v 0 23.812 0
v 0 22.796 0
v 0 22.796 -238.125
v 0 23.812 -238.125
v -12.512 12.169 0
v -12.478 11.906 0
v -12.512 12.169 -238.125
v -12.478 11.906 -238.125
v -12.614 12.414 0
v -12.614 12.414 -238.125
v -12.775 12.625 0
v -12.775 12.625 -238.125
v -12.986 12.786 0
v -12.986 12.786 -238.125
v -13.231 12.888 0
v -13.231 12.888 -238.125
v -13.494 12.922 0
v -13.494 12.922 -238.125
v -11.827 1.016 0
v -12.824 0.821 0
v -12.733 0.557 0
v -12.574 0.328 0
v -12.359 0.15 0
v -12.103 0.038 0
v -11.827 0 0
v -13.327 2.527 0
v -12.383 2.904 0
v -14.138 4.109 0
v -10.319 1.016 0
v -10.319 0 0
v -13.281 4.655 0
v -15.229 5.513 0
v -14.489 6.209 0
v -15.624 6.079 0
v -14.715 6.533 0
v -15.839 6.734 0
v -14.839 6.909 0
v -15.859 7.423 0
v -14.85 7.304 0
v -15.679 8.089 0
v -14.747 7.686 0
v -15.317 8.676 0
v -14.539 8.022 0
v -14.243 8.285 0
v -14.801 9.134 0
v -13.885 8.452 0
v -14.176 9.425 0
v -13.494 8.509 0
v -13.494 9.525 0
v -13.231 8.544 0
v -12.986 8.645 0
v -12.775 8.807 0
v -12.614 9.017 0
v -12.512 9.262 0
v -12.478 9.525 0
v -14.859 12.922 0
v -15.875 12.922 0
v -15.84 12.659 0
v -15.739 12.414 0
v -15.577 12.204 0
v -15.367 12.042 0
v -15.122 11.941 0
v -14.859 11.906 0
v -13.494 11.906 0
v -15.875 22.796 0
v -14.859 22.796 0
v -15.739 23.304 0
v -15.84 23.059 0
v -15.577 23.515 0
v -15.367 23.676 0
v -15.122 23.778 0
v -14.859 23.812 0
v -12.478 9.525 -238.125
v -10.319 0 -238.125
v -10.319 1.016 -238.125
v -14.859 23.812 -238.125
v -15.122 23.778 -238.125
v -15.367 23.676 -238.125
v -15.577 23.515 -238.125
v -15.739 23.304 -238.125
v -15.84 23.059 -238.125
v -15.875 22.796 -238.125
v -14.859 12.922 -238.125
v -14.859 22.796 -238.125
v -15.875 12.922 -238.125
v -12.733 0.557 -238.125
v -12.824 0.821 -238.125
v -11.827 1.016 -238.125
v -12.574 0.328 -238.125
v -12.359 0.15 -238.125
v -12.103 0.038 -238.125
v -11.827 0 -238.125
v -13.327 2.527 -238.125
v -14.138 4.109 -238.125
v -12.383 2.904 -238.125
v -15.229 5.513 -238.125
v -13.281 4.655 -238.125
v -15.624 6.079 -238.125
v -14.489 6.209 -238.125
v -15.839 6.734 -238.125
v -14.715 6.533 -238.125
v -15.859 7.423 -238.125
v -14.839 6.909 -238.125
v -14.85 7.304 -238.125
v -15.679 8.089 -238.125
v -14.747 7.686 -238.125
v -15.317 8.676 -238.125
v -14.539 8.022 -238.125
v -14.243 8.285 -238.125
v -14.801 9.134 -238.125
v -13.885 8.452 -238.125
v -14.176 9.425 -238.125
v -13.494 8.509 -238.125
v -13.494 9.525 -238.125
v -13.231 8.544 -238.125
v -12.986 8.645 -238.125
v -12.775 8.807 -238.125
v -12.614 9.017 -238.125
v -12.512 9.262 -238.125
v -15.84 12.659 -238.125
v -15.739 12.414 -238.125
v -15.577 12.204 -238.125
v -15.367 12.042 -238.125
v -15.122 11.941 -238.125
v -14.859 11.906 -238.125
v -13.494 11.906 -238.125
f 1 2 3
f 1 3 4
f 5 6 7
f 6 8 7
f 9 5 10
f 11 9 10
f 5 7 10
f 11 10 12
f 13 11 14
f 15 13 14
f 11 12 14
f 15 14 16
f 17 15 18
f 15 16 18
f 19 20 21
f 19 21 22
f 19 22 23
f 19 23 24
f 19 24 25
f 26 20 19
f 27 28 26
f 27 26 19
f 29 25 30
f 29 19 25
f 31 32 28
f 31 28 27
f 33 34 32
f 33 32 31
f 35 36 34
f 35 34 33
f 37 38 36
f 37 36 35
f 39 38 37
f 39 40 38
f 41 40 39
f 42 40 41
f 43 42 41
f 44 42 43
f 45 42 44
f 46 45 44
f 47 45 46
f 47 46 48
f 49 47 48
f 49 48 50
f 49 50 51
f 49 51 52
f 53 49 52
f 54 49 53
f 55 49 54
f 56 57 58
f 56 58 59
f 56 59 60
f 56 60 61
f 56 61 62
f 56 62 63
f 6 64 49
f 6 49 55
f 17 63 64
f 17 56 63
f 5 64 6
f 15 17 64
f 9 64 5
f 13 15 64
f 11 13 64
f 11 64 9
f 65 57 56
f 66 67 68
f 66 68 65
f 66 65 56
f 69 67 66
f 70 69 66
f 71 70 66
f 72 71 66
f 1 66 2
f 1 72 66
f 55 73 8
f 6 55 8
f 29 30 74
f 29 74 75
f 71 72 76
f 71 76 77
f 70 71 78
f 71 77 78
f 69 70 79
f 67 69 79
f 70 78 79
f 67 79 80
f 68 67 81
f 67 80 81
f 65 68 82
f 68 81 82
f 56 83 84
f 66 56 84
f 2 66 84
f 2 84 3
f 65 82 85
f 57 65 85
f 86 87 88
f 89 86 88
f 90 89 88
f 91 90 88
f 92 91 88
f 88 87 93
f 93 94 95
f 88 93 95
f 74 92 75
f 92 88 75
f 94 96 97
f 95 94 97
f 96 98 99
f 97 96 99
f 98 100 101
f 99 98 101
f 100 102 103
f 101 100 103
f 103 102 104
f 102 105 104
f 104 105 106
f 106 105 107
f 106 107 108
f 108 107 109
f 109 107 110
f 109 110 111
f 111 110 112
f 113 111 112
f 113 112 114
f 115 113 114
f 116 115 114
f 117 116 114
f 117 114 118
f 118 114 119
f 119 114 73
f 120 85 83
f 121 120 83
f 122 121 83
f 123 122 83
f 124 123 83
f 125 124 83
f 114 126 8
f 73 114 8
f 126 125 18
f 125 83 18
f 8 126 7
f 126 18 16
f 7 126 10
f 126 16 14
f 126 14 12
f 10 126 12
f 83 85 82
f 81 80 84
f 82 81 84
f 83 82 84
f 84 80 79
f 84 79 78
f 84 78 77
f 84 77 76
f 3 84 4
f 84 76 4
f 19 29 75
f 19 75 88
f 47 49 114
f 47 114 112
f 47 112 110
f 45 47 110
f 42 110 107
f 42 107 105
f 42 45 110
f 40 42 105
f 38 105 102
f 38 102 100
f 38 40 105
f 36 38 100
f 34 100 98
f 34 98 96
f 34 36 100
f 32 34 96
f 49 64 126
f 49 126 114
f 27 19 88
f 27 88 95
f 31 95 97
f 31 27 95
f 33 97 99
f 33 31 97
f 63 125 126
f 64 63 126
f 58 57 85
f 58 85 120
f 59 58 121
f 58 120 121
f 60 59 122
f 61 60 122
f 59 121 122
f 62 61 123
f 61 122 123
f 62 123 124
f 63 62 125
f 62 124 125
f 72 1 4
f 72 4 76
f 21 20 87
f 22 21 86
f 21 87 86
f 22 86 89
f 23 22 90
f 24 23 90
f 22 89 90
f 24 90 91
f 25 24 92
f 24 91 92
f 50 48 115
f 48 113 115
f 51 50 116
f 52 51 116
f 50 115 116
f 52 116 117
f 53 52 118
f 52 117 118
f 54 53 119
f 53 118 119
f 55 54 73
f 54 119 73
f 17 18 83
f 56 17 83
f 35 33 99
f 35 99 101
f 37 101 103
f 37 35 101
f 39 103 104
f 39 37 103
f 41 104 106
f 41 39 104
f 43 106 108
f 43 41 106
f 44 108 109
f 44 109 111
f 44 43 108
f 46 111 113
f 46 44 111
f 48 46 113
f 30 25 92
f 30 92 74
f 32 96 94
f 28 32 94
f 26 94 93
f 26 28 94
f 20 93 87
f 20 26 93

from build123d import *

# Parameters (mm, degrees)
EXTRUDE_THIN1_DEPTH = 238.125
FILLET1_R           = 1.016


with BuildPart() as part:
    # Sketch1 → Extrude-Thin1 (new body)
    with BuildSketch(Plane.XY):
        with BuildLine():
            Line((0, 23.8125), (-15.875, 23.8125))
            Line((-15.875, 23.8125), (-15.875, 11.90625))
            Line((-15.875, 11.90625), (-13.49375, 11.90625))
            Line((-13.49375, 11.90625), (-13.49375, 9.525))
            ThreePointArc((-13.49375, 9.525), (-15.679243133, 8.08925057), (-15.229296459, 5.51334206))
            ThreePointArc((-15.229296459, 5.51334206), (-13.514036913, 2.963393123), (-12.7, 0))
            Line((-12.7, 0), (-10.31875, 0))
            Line((-10.31875, 0), (-10.31875, 1.016))
            Line((-10.31875, 1.016), (-11.826680113, 1.016))
            ThreePointArc((-11.826680113, 1.016), (-12.791218599, 3.800383088), (-14.488796637, 6.208982781))
            ThreePointArc((-14.488796637, 6.208982781), (-14.417167703, 8.149338041), (-12.47775, 8.05569932))
            Line((-12.47775, 8.05569932), (-12.47775, 12.92225))
            Line((-12.47775, 12.92225), (-14.859, 12.92225))
            Line((-14.859, 12.92225), (-14.859, 22.7965))
            Line((-14.859, 22.7965), (0, 22.7965))
            Line((0, 22.7965), (0, 23.8125))
        make_face()
    extrude(amount=-EXTRUDE_THIN1_DEPTH)

    # Fillet1
    fillet1_edges = [part.edges().sort_by_distance(p)[0] for p in [
        (-12.47775, 12.92225, -119.0625),
        (-12.47775, 8.05569932, -119.0625),
        (-12.7, 0, -119.0625),
        (-15.875, 11.90625, -119.0625),
        (-15.875, 23.8125, -119.0625),
    ]]
    fillet(fillet1_edges, radius=FILLET1_R)


solid = part.part
